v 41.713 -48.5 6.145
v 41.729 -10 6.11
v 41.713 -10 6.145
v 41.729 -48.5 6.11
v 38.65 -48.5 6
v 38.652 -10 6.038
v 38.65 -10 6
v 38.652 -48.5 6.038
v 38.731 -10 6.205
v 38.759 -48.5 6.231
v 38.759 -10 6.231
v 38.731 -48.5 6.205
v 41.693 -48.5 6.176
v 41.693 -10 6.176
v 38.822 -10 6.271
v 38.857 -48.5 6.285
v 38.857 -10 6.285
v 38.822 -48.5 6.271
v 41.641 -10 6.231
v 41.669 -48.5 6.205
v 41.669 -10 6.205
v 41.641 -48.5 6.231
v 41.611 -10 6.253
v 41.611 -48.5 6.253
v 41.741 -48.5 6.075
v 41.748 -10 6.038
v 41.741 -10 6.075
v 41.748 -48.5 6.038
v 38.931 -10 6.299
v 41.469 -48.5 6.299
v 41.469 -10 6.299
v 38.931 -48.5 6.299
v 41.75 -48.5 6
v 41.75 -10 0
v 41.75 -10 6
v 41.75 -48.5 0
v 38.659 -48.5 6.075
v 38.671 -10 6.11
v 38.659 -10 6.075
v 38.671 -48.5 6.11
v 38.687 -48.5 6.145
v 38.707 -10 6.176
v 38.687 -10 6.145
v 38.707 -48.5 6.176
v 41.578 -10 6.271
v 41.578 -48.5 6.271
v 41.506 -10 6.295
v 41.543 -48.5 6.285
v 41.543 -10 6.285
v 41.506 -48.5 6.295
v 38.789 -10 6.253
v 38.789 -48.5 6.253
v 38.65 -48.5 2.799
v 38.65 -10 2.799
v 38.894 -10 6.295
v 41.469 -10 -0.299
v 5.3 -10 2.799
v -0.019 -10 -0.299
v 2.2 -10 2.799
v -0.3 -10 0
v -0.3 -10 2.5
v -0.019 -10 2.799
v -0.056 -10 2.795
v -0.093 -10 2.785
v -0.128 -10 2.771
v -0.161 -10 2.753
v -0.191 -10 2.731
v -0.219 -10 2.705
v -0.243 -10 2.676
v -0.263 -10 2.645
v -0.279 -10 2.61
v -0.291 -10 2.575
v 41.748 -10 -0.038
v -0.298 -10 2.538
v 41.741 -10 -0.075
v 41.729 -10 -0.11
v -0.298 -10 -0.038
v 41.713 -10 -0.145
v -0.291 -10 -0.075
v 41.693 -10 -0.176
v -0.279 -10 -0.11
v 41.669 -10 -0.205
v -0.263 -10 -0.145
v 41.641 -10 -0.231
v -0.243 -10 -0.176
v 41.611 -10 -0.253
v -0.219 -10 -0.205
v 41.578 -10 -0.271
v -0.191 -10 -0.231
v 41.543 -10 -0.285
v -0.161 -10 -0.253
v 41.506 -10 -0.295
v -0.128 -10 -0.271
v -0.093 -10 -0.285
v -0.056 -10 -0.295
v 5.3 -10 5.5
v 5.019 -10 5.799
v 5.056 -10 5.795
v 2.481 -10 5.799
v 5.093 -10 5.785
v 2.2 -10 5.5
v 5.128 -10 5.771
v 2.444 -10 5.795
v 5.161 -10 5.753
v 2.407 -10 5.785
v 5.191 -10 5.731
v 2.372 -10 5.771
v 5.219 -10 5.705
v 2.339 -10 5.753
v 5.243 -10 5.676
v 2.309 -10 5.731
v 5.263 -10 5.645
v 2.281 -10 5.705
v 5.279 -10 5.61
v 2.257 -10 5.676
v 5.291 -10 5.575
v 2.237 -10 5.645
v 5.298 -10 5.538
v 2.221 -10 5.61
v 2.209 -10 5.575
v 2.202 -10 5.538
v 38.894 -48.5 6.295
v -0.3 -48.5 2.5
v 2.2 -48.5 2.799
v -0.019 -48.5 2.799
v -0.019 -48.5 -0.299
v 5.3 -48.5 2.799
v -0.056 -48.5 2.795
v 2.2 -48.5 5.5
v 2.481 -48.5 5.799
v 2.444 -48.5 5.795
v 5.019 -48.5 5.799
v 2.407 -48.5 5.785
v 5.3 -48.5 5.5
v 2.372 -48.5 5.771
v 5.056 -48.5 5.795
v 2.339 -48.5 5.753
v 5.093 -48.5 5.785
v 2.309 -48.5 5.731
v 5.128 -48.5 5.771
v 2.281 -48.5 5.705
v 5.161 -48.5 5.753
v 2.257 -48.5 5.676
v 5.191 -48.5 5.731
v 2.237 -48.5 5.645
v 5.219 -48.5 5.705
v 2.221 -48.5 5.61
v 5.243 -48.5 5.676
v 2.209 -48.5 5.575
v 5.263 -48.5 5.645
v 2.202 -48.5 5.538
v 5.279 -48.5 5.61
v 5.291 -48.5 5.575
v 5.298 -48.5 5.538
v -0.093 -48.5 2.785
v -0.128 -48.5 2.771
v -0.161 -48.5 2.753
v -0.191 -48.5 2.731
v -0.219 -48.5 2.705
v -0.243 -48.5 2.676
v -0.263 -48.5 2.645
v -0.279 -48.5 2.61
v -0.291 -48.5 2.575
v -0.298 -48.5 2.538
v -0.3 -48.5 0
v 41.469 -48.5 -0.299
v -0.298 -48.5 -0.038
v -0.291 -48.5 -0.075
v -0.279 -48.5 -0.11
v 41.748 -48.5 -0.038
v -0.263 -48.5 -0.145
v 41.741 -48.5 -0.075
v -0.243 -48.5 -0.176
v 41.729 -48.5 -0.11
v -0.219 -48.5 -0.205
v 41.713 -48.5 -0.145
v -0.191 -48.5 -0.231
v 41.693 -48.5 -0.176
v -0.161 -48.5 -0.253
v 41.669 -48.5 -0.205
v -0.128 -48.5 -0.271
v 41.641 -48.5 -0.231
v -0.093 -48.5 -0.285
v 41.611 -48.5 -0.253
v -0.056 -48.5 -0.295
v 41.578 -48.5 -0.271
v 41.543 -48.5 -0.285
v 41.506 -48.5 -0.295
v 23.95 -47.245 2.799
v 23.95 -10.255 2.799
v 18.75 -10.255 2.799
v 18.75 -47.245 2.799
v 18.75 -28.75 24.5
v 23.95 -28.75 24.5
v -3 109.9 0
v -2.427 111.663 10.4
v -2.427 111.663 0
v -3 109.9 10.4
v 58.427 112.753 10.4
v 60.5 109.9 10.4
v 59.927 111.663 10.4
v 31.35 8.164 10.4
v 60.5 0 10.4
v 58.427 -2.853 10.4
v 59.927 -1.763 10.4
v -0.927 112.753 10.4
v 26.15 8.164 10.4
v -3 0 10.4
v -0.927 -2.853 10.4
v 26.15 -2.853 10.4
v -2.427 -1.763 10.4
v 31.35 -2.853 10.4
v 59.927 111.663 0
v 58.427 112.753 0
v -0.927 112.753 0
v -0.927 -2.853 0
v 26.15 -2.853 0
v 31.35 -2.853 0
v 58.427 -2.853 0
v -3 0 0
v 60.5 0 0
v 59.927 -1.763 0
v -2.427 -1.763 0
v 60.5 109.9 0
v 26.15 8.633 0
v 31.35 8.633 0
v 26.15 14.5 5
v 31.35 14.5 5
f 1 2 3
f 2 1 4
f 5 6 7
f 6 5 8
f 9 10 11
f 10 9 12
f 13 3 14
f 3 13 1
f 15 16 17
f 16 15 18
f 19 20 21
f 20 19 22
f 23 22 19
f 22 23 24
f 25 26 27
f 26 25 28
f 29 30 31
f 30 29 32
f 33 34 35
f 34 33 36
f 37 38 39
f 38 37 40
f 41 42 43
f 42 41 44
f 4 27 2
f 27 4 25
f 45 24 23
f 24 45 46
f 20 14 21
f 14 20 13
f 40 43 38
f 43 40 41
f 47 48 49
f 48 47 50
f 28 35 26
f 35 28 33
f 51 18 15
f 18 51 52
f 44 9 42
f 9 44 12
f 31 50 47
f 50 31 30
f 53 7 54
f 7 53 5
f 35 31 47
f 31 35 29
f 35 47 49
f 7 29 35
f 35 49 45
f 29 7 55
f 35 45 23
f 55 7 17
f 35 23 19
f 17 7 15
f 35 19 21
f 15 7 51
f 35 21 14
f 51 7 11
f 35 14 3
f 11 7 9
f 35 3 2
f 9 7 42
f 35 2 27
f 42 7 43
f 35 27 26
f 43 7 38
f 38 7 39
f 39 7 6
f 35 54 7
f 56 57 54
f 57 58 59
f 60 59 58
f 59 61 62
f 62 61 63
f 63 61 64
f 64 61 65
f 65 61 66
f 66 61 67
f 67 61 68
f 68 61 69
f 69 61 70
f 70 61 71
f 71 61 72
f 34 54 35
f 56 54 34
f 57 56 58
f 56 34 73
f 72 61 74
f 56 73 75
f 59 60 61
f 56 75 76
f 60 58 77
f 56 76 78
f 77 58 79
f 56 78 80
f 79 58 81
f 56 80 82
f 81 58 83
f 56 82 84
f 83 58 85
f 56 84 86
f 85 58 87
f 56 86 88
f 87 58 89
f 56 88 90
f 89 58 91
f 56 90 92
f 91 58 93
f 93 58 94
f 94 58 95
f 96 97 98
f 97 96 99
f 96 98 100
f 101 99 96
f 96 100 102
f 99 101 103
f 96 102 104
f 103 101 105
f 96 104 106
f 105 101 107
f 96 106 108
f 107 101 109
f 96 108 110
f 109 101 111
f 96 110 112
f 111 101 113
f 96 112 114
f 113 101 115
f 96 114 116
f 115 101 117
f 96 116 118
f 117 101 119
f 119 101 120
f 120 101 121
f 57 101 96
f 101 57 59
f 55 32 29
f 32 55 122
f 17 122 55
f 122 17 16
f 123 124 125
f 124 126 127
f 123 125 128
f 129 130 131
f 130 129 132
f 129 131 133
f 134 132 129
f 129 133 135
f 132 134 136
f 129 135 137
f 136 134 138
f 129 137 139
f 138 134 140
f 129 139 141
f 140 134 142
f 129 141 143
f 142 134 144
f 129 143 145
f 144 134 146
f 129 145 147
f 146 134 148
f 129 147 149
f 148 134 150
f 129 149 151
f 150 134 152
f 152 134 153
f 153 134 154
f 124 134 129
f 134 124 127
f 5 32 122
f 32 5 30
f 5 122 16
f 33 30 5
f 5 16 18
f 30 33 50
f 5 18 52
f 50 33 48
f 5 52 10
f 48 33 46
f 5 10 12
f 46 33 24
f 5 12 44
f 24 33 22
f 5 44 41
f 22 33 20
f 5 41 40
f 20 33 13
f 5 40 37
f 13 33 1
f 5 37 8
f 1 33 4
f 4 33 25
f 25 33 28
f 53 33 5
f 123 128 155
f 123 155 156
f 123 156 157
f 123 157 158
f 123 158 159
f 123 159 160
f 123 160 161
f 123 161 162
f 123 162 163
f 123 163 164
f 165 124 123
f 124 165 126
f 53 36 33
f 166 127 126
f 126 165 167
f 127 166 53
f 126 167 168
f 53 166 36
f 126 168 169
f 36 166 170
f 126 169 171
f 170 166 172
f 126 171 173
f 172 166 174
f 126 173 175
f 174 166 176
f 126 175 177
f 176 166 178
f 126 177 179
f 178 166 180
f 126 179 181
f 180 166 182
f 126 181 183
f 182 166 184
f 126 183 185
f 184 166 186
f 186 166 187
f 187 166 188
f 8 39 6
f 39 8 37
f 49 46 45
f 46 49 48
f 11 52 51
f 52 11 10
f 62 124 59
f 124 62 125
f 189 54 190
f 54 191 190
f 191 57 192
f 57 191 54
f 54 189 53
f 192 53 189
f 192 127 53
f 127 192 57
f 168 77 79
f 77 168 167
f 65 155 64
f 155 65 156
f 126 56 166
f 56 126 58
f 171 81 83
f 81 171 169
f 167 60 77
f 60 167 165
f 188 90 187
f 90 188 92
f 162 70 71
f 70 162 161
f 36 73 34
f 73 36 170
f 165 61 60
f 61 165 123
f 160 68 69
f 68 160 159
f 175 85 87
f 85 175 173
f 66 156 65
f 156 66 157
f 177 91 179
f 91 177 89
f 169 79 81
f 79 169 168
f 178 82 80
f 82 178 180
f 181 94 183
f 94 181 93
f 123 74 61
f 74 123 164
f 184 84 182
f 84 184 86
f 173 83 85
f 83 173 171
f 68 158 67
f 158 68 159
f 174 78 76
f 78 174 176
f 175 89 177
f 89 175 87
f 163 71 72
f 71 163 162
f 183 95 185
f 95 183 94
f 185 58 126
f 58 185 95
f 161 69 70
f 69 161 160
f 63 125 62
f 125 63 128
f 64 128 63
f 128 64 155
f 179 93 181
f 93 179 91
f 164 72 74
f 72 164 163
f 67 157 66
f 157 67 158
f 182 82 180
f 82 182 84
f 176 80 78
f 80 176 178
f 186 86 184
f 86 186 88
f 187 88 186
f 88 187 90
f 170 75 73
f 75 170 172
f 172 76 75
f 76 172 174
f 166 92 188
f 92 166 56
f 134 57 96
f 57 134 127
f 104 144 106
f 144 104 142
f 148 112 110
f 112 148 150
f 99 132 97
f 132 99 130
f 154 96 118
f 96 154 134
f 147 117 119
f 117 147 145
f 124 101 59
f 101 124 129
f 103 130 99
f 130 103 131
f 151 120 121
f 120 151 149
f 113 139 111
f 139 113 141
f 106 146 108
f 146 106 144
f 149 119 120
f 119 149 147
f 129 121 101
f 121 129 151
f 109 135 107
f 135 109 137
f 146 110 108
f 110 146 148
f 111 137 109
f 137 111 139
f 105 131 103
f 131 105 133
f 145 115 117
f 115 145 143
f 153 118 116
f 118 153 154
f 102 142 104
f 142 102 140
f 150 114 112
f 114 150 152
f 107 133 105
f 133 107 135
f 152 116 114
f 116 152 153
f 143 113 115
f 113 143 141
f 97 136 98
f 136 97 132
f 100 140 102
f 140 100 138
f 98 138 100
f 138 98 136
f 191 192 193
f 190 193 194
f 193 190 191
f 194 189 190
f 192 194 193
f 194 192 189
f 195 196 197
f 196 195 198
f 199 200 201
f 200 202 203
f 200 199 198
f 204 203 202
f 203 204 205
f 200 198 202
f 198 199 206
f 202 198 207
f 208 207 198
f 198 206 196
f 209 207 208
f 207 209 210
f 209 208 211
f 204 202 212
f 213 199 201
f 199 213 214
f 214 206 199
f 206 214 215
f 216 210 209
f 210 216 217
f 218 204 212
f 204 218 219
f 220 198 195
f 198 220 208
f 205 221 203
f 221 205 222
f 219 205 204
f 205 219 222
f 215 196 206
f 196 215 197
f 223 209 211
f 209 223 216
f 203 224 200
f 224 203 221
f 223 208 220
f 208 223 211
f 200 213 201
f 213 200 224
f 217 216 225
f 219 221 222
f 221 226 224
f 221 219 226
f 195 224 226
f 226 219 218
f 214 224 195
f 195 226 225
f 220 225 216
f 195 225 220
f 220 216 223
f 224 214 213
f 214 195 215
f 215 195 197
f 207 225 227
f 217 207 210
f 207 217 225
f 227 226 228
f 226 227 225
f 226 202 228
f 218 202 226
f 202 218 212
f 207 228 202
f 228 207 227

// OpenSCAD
//
// Refridgerator door load lock
//
//variables = values;
base_thickness = 2.5;
base_lip = 6.0;
base_lip_inset = 5.5;
base_width = 41.45;
base_extruded_height = 37.5;

loadlock_width = 57.5;
loadlock_length = 109.9; 
loadlock_extruded_height = 5.2;
loadlock_base_triangle_thickness = 5.2;
loadlock_triangle_base = base_extruded_height; 

// base_part
module base_part(){
// form a polygon outlining the 2d shape of the base.
// extrude this shape by the amount in base_extruded_height
translate([loadlock_triangle_base/2,base_thickness,base_extruded_height])rotate([0,90,0])linear_extrude(height=loadlock_base_triangle_thickness)polygon(points=[[0,0],[loadlock_triangle_base,0],[loadlock_triangle_base/2,22]]);
$fn=50;
minkowski(){
  linear_extrude(height=base_extruded_height)polygon(points=[ [0,0], [base_width,0], [base_width,base_lip], [base_width-base_thickness,base_lip], [base_width-base_thickness,base_thickness], [base_thickness*2,base_thickness], [base_thickness*2,base_lip_inset], [base_thickness,base_lip_inset], [base_thickness,base_thickness], [0,base_thickness] ]);
  cylinder(r=0.3,h=1);
  }
}
module loadlock_part(){
//create a 2d rect with loadlock_width and loadlock_length
//smoth the corners with a 2d minkowski
// extrude the output 2d shape by loadlock_extruded_height
// remove a notch in the shape of the joint for later assembly
difference(){
  minkowski(){
    linear_extrude(height=loadlock_extruded_height) circle(3);
    linear_extrude(height=loadlock_extruded_height) square([loadlock_width,loadlock_length]);
  }
  translate([loadlock_width/2-loadlock_base_triangle_thickness/2,-base_thickness-5,base_extruded_height/2+2*base_thickness])rotate([0,90,0])linear_extrude(height=loadlock_base_triangle_thickness)polygon(points=[[0,0],[loadlock_triangle_base,0],[loadlock_triangle_base/2,22]]);
  }
}
// call the parts and make decisions about orienting them w/r/t each other for printing or combination
union(){
translate([0,-10,0])rotate([90,0,0])base_part();
translate([0,0,0])loadlock_part();
}
